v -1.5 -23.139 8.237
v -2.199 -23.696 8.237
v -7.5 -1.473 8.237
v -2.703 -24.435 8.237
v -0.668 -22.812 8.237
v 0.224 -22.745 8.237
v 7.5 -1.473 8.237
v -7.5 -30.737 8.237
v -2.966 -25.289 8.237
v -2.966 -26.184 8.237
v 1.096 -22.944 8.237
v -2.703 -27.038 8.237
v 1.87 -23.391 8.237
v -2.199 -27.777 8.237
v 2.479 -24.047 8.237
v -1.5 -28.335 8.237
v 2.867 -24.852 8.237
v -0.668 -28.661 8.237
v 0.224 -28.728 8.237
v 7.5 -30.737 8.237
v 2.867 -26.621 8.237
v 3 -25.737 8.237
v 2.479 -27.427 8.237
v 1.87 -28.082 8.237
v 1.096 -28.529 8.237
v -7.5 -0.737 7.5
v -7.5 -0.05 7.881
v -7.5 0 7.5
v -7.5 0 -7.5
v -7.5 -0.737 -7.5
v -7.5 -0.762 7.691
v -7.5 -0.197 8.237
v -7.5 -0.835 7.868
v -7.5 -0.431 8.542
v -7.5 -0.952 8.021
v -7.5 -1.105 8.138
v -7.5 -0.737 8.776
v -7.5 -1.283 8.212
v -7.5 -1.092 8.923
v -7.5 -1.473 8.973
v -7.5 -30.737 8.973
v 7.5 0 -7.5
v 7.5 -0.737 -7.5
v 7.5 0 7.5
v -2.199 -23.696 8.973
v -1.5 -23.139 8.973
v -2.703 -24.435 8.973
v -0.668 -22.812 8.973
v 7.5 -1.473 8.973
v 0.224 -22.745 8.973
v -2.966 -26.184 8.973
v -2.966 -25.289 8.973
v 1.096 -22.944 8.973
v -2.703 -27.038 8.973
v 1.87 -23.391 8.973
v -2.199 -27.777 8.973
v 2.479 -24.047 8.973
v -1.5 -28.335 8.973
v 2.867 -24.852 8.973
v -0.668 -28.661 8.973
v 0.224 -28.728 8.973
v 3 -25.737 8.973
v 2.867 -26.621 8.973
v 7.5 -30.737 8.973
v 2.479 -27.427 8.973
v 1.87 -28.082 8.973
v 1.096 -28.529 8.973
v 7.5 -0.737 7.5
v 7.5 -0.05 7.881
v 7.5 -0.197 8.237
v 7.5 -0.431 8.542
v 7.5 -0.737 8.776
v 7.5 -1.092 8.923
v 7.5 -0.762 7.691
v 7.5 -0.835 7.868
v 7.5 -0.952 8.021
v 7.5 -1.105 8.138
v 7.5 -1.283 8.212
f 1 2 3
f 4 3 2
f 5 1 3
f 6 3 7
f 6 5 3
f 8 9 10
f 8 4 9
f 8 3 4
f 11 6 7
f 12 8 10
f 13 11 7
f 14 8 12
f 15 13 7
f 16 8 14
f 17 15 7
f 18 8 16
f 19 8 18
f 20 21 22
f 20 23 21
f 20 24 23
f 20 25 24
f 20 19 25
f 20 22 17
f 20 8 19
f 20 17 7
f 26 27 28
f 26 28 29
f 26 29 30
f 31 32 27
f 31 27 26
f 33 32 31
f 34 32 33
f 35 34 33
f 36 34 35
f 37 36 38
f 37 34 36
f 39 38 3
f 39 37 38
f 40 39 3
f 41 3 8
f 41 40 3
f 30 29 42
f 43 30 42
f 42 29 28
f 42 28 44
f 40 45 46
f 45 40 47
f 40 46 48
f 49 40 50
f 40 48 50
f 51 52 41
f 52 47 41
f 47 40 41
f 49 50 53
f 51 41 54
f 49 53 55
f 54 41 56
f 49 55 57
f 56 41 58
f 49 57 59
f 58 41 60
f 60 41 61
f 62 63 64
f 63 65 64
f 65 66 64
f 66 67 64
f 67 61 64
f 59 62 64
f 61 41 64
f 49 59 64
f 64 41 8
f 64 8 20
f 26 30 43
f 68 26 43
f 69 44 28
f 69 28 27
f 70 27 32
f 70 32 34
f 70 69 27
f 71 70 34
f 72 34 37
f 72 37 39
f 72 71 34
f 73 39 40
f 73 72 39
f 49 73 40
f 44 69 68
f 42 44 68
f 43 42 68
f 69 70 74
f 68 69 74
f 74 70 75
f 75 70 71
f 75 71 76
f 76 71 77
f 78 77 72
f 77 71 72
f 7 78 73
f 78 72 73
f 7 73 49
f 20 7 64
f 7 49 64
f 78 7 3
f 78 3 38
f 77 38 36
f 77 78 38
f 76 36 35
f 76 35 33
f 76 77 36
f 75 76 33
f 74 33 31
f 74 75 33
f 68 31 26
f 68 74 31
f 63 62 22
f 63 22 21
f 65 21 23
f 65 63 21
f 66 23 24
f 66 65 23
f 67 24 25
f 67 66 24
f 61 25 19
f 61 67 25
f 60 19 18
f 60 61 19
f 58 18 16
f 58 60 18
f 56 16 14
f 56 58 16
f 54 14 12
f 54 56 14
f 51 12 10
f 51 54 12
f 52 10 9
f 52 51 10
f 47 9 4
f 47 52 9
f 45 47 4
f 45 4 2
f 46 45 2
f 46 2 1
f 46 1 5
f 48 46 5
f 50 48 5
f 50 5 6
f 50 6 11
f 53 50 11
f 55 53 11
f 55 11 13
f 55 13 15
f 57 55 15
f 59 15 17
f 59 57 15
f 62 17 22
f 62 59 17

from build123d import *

# Parameters (mm, degrees)
SKETCH1_W               = 15
SKETCH1_H               = 15
BASE_FLANGE1_DEPTH      = 0.7366
EDGE_FLANGE1_DEPTH      = 15
EDGE_FLANGE1_START      = -0.7366
EDGE_FLANGE1_PROFILE_W  = 15
EDGE_FLANGE1_PROFILE_H  = 29.2634
EDGE_FLANGE1_PROFILE_R  = 3
EDGE_FLANGE1_FLAT_DEPTH = 0.7366


# Sheet-metal steps are written as plain solids
with BuildPart() as part:
    # Sketch1 → Base-Flange1 (new body)
    with BuildSketch(Plane(origin=(0, 0, 0), x_dir=(1, 0, 0), z_dir=(0, 1, 0))):
        Rectangle(SKETCH1_W, SKETCH1_H)
    extrude(amount=-BASE_FLANGE1_DEPTH)

    # Edge-Flange1 bend section (across the edge) → Edge-Flange1 (add)
    with BuildSketch(Plane(origin=(7.5, -0.7366, 8.2366), x_dir=(0, 0, -1), z_dir=(-1, 0, 0))):
        with BuildLine():
            Line((-0.7366, 0.7366), (0, 0.7366))
            ThreePointArc((0, 0.7366), (0.215745145, 0.215745145), (0.7366, 0))
            Line((0.7366, 0), (0.7366, -0.7366))
            ThreePointArc((0.7366, -0.7366), (-0.30510971, -0.30510971), (-0.7366, 0.7366))
        make_face()
    extrude(amount=EDGE_FLANGE1_DEPTH)

    # Edge-Flange1 profile (on flange) → Edge-Flange1 flat (add)
    with BuildSketch(Plane(origin=(0, -0.7366, 8.2366), x_dir=(1, 0, 0), z_dir=(0, 0, -1)).offset(EDGE_FLANGE1_START)):
        with Locations((0, 15.3683)):
            Rectangle(EDGE_FLANGE1_PROFILE_W, EDGE_FLANGE1_PROFILE_H)
        with Locations((0, 25)):
            Circle(EDGE_FLANGE1_PROFILE_R, mode=Mode.SUBTRACT)
    extrude(amount=EDGE_FLANGE1_FLAT_DEPTH)


solid = part.part
